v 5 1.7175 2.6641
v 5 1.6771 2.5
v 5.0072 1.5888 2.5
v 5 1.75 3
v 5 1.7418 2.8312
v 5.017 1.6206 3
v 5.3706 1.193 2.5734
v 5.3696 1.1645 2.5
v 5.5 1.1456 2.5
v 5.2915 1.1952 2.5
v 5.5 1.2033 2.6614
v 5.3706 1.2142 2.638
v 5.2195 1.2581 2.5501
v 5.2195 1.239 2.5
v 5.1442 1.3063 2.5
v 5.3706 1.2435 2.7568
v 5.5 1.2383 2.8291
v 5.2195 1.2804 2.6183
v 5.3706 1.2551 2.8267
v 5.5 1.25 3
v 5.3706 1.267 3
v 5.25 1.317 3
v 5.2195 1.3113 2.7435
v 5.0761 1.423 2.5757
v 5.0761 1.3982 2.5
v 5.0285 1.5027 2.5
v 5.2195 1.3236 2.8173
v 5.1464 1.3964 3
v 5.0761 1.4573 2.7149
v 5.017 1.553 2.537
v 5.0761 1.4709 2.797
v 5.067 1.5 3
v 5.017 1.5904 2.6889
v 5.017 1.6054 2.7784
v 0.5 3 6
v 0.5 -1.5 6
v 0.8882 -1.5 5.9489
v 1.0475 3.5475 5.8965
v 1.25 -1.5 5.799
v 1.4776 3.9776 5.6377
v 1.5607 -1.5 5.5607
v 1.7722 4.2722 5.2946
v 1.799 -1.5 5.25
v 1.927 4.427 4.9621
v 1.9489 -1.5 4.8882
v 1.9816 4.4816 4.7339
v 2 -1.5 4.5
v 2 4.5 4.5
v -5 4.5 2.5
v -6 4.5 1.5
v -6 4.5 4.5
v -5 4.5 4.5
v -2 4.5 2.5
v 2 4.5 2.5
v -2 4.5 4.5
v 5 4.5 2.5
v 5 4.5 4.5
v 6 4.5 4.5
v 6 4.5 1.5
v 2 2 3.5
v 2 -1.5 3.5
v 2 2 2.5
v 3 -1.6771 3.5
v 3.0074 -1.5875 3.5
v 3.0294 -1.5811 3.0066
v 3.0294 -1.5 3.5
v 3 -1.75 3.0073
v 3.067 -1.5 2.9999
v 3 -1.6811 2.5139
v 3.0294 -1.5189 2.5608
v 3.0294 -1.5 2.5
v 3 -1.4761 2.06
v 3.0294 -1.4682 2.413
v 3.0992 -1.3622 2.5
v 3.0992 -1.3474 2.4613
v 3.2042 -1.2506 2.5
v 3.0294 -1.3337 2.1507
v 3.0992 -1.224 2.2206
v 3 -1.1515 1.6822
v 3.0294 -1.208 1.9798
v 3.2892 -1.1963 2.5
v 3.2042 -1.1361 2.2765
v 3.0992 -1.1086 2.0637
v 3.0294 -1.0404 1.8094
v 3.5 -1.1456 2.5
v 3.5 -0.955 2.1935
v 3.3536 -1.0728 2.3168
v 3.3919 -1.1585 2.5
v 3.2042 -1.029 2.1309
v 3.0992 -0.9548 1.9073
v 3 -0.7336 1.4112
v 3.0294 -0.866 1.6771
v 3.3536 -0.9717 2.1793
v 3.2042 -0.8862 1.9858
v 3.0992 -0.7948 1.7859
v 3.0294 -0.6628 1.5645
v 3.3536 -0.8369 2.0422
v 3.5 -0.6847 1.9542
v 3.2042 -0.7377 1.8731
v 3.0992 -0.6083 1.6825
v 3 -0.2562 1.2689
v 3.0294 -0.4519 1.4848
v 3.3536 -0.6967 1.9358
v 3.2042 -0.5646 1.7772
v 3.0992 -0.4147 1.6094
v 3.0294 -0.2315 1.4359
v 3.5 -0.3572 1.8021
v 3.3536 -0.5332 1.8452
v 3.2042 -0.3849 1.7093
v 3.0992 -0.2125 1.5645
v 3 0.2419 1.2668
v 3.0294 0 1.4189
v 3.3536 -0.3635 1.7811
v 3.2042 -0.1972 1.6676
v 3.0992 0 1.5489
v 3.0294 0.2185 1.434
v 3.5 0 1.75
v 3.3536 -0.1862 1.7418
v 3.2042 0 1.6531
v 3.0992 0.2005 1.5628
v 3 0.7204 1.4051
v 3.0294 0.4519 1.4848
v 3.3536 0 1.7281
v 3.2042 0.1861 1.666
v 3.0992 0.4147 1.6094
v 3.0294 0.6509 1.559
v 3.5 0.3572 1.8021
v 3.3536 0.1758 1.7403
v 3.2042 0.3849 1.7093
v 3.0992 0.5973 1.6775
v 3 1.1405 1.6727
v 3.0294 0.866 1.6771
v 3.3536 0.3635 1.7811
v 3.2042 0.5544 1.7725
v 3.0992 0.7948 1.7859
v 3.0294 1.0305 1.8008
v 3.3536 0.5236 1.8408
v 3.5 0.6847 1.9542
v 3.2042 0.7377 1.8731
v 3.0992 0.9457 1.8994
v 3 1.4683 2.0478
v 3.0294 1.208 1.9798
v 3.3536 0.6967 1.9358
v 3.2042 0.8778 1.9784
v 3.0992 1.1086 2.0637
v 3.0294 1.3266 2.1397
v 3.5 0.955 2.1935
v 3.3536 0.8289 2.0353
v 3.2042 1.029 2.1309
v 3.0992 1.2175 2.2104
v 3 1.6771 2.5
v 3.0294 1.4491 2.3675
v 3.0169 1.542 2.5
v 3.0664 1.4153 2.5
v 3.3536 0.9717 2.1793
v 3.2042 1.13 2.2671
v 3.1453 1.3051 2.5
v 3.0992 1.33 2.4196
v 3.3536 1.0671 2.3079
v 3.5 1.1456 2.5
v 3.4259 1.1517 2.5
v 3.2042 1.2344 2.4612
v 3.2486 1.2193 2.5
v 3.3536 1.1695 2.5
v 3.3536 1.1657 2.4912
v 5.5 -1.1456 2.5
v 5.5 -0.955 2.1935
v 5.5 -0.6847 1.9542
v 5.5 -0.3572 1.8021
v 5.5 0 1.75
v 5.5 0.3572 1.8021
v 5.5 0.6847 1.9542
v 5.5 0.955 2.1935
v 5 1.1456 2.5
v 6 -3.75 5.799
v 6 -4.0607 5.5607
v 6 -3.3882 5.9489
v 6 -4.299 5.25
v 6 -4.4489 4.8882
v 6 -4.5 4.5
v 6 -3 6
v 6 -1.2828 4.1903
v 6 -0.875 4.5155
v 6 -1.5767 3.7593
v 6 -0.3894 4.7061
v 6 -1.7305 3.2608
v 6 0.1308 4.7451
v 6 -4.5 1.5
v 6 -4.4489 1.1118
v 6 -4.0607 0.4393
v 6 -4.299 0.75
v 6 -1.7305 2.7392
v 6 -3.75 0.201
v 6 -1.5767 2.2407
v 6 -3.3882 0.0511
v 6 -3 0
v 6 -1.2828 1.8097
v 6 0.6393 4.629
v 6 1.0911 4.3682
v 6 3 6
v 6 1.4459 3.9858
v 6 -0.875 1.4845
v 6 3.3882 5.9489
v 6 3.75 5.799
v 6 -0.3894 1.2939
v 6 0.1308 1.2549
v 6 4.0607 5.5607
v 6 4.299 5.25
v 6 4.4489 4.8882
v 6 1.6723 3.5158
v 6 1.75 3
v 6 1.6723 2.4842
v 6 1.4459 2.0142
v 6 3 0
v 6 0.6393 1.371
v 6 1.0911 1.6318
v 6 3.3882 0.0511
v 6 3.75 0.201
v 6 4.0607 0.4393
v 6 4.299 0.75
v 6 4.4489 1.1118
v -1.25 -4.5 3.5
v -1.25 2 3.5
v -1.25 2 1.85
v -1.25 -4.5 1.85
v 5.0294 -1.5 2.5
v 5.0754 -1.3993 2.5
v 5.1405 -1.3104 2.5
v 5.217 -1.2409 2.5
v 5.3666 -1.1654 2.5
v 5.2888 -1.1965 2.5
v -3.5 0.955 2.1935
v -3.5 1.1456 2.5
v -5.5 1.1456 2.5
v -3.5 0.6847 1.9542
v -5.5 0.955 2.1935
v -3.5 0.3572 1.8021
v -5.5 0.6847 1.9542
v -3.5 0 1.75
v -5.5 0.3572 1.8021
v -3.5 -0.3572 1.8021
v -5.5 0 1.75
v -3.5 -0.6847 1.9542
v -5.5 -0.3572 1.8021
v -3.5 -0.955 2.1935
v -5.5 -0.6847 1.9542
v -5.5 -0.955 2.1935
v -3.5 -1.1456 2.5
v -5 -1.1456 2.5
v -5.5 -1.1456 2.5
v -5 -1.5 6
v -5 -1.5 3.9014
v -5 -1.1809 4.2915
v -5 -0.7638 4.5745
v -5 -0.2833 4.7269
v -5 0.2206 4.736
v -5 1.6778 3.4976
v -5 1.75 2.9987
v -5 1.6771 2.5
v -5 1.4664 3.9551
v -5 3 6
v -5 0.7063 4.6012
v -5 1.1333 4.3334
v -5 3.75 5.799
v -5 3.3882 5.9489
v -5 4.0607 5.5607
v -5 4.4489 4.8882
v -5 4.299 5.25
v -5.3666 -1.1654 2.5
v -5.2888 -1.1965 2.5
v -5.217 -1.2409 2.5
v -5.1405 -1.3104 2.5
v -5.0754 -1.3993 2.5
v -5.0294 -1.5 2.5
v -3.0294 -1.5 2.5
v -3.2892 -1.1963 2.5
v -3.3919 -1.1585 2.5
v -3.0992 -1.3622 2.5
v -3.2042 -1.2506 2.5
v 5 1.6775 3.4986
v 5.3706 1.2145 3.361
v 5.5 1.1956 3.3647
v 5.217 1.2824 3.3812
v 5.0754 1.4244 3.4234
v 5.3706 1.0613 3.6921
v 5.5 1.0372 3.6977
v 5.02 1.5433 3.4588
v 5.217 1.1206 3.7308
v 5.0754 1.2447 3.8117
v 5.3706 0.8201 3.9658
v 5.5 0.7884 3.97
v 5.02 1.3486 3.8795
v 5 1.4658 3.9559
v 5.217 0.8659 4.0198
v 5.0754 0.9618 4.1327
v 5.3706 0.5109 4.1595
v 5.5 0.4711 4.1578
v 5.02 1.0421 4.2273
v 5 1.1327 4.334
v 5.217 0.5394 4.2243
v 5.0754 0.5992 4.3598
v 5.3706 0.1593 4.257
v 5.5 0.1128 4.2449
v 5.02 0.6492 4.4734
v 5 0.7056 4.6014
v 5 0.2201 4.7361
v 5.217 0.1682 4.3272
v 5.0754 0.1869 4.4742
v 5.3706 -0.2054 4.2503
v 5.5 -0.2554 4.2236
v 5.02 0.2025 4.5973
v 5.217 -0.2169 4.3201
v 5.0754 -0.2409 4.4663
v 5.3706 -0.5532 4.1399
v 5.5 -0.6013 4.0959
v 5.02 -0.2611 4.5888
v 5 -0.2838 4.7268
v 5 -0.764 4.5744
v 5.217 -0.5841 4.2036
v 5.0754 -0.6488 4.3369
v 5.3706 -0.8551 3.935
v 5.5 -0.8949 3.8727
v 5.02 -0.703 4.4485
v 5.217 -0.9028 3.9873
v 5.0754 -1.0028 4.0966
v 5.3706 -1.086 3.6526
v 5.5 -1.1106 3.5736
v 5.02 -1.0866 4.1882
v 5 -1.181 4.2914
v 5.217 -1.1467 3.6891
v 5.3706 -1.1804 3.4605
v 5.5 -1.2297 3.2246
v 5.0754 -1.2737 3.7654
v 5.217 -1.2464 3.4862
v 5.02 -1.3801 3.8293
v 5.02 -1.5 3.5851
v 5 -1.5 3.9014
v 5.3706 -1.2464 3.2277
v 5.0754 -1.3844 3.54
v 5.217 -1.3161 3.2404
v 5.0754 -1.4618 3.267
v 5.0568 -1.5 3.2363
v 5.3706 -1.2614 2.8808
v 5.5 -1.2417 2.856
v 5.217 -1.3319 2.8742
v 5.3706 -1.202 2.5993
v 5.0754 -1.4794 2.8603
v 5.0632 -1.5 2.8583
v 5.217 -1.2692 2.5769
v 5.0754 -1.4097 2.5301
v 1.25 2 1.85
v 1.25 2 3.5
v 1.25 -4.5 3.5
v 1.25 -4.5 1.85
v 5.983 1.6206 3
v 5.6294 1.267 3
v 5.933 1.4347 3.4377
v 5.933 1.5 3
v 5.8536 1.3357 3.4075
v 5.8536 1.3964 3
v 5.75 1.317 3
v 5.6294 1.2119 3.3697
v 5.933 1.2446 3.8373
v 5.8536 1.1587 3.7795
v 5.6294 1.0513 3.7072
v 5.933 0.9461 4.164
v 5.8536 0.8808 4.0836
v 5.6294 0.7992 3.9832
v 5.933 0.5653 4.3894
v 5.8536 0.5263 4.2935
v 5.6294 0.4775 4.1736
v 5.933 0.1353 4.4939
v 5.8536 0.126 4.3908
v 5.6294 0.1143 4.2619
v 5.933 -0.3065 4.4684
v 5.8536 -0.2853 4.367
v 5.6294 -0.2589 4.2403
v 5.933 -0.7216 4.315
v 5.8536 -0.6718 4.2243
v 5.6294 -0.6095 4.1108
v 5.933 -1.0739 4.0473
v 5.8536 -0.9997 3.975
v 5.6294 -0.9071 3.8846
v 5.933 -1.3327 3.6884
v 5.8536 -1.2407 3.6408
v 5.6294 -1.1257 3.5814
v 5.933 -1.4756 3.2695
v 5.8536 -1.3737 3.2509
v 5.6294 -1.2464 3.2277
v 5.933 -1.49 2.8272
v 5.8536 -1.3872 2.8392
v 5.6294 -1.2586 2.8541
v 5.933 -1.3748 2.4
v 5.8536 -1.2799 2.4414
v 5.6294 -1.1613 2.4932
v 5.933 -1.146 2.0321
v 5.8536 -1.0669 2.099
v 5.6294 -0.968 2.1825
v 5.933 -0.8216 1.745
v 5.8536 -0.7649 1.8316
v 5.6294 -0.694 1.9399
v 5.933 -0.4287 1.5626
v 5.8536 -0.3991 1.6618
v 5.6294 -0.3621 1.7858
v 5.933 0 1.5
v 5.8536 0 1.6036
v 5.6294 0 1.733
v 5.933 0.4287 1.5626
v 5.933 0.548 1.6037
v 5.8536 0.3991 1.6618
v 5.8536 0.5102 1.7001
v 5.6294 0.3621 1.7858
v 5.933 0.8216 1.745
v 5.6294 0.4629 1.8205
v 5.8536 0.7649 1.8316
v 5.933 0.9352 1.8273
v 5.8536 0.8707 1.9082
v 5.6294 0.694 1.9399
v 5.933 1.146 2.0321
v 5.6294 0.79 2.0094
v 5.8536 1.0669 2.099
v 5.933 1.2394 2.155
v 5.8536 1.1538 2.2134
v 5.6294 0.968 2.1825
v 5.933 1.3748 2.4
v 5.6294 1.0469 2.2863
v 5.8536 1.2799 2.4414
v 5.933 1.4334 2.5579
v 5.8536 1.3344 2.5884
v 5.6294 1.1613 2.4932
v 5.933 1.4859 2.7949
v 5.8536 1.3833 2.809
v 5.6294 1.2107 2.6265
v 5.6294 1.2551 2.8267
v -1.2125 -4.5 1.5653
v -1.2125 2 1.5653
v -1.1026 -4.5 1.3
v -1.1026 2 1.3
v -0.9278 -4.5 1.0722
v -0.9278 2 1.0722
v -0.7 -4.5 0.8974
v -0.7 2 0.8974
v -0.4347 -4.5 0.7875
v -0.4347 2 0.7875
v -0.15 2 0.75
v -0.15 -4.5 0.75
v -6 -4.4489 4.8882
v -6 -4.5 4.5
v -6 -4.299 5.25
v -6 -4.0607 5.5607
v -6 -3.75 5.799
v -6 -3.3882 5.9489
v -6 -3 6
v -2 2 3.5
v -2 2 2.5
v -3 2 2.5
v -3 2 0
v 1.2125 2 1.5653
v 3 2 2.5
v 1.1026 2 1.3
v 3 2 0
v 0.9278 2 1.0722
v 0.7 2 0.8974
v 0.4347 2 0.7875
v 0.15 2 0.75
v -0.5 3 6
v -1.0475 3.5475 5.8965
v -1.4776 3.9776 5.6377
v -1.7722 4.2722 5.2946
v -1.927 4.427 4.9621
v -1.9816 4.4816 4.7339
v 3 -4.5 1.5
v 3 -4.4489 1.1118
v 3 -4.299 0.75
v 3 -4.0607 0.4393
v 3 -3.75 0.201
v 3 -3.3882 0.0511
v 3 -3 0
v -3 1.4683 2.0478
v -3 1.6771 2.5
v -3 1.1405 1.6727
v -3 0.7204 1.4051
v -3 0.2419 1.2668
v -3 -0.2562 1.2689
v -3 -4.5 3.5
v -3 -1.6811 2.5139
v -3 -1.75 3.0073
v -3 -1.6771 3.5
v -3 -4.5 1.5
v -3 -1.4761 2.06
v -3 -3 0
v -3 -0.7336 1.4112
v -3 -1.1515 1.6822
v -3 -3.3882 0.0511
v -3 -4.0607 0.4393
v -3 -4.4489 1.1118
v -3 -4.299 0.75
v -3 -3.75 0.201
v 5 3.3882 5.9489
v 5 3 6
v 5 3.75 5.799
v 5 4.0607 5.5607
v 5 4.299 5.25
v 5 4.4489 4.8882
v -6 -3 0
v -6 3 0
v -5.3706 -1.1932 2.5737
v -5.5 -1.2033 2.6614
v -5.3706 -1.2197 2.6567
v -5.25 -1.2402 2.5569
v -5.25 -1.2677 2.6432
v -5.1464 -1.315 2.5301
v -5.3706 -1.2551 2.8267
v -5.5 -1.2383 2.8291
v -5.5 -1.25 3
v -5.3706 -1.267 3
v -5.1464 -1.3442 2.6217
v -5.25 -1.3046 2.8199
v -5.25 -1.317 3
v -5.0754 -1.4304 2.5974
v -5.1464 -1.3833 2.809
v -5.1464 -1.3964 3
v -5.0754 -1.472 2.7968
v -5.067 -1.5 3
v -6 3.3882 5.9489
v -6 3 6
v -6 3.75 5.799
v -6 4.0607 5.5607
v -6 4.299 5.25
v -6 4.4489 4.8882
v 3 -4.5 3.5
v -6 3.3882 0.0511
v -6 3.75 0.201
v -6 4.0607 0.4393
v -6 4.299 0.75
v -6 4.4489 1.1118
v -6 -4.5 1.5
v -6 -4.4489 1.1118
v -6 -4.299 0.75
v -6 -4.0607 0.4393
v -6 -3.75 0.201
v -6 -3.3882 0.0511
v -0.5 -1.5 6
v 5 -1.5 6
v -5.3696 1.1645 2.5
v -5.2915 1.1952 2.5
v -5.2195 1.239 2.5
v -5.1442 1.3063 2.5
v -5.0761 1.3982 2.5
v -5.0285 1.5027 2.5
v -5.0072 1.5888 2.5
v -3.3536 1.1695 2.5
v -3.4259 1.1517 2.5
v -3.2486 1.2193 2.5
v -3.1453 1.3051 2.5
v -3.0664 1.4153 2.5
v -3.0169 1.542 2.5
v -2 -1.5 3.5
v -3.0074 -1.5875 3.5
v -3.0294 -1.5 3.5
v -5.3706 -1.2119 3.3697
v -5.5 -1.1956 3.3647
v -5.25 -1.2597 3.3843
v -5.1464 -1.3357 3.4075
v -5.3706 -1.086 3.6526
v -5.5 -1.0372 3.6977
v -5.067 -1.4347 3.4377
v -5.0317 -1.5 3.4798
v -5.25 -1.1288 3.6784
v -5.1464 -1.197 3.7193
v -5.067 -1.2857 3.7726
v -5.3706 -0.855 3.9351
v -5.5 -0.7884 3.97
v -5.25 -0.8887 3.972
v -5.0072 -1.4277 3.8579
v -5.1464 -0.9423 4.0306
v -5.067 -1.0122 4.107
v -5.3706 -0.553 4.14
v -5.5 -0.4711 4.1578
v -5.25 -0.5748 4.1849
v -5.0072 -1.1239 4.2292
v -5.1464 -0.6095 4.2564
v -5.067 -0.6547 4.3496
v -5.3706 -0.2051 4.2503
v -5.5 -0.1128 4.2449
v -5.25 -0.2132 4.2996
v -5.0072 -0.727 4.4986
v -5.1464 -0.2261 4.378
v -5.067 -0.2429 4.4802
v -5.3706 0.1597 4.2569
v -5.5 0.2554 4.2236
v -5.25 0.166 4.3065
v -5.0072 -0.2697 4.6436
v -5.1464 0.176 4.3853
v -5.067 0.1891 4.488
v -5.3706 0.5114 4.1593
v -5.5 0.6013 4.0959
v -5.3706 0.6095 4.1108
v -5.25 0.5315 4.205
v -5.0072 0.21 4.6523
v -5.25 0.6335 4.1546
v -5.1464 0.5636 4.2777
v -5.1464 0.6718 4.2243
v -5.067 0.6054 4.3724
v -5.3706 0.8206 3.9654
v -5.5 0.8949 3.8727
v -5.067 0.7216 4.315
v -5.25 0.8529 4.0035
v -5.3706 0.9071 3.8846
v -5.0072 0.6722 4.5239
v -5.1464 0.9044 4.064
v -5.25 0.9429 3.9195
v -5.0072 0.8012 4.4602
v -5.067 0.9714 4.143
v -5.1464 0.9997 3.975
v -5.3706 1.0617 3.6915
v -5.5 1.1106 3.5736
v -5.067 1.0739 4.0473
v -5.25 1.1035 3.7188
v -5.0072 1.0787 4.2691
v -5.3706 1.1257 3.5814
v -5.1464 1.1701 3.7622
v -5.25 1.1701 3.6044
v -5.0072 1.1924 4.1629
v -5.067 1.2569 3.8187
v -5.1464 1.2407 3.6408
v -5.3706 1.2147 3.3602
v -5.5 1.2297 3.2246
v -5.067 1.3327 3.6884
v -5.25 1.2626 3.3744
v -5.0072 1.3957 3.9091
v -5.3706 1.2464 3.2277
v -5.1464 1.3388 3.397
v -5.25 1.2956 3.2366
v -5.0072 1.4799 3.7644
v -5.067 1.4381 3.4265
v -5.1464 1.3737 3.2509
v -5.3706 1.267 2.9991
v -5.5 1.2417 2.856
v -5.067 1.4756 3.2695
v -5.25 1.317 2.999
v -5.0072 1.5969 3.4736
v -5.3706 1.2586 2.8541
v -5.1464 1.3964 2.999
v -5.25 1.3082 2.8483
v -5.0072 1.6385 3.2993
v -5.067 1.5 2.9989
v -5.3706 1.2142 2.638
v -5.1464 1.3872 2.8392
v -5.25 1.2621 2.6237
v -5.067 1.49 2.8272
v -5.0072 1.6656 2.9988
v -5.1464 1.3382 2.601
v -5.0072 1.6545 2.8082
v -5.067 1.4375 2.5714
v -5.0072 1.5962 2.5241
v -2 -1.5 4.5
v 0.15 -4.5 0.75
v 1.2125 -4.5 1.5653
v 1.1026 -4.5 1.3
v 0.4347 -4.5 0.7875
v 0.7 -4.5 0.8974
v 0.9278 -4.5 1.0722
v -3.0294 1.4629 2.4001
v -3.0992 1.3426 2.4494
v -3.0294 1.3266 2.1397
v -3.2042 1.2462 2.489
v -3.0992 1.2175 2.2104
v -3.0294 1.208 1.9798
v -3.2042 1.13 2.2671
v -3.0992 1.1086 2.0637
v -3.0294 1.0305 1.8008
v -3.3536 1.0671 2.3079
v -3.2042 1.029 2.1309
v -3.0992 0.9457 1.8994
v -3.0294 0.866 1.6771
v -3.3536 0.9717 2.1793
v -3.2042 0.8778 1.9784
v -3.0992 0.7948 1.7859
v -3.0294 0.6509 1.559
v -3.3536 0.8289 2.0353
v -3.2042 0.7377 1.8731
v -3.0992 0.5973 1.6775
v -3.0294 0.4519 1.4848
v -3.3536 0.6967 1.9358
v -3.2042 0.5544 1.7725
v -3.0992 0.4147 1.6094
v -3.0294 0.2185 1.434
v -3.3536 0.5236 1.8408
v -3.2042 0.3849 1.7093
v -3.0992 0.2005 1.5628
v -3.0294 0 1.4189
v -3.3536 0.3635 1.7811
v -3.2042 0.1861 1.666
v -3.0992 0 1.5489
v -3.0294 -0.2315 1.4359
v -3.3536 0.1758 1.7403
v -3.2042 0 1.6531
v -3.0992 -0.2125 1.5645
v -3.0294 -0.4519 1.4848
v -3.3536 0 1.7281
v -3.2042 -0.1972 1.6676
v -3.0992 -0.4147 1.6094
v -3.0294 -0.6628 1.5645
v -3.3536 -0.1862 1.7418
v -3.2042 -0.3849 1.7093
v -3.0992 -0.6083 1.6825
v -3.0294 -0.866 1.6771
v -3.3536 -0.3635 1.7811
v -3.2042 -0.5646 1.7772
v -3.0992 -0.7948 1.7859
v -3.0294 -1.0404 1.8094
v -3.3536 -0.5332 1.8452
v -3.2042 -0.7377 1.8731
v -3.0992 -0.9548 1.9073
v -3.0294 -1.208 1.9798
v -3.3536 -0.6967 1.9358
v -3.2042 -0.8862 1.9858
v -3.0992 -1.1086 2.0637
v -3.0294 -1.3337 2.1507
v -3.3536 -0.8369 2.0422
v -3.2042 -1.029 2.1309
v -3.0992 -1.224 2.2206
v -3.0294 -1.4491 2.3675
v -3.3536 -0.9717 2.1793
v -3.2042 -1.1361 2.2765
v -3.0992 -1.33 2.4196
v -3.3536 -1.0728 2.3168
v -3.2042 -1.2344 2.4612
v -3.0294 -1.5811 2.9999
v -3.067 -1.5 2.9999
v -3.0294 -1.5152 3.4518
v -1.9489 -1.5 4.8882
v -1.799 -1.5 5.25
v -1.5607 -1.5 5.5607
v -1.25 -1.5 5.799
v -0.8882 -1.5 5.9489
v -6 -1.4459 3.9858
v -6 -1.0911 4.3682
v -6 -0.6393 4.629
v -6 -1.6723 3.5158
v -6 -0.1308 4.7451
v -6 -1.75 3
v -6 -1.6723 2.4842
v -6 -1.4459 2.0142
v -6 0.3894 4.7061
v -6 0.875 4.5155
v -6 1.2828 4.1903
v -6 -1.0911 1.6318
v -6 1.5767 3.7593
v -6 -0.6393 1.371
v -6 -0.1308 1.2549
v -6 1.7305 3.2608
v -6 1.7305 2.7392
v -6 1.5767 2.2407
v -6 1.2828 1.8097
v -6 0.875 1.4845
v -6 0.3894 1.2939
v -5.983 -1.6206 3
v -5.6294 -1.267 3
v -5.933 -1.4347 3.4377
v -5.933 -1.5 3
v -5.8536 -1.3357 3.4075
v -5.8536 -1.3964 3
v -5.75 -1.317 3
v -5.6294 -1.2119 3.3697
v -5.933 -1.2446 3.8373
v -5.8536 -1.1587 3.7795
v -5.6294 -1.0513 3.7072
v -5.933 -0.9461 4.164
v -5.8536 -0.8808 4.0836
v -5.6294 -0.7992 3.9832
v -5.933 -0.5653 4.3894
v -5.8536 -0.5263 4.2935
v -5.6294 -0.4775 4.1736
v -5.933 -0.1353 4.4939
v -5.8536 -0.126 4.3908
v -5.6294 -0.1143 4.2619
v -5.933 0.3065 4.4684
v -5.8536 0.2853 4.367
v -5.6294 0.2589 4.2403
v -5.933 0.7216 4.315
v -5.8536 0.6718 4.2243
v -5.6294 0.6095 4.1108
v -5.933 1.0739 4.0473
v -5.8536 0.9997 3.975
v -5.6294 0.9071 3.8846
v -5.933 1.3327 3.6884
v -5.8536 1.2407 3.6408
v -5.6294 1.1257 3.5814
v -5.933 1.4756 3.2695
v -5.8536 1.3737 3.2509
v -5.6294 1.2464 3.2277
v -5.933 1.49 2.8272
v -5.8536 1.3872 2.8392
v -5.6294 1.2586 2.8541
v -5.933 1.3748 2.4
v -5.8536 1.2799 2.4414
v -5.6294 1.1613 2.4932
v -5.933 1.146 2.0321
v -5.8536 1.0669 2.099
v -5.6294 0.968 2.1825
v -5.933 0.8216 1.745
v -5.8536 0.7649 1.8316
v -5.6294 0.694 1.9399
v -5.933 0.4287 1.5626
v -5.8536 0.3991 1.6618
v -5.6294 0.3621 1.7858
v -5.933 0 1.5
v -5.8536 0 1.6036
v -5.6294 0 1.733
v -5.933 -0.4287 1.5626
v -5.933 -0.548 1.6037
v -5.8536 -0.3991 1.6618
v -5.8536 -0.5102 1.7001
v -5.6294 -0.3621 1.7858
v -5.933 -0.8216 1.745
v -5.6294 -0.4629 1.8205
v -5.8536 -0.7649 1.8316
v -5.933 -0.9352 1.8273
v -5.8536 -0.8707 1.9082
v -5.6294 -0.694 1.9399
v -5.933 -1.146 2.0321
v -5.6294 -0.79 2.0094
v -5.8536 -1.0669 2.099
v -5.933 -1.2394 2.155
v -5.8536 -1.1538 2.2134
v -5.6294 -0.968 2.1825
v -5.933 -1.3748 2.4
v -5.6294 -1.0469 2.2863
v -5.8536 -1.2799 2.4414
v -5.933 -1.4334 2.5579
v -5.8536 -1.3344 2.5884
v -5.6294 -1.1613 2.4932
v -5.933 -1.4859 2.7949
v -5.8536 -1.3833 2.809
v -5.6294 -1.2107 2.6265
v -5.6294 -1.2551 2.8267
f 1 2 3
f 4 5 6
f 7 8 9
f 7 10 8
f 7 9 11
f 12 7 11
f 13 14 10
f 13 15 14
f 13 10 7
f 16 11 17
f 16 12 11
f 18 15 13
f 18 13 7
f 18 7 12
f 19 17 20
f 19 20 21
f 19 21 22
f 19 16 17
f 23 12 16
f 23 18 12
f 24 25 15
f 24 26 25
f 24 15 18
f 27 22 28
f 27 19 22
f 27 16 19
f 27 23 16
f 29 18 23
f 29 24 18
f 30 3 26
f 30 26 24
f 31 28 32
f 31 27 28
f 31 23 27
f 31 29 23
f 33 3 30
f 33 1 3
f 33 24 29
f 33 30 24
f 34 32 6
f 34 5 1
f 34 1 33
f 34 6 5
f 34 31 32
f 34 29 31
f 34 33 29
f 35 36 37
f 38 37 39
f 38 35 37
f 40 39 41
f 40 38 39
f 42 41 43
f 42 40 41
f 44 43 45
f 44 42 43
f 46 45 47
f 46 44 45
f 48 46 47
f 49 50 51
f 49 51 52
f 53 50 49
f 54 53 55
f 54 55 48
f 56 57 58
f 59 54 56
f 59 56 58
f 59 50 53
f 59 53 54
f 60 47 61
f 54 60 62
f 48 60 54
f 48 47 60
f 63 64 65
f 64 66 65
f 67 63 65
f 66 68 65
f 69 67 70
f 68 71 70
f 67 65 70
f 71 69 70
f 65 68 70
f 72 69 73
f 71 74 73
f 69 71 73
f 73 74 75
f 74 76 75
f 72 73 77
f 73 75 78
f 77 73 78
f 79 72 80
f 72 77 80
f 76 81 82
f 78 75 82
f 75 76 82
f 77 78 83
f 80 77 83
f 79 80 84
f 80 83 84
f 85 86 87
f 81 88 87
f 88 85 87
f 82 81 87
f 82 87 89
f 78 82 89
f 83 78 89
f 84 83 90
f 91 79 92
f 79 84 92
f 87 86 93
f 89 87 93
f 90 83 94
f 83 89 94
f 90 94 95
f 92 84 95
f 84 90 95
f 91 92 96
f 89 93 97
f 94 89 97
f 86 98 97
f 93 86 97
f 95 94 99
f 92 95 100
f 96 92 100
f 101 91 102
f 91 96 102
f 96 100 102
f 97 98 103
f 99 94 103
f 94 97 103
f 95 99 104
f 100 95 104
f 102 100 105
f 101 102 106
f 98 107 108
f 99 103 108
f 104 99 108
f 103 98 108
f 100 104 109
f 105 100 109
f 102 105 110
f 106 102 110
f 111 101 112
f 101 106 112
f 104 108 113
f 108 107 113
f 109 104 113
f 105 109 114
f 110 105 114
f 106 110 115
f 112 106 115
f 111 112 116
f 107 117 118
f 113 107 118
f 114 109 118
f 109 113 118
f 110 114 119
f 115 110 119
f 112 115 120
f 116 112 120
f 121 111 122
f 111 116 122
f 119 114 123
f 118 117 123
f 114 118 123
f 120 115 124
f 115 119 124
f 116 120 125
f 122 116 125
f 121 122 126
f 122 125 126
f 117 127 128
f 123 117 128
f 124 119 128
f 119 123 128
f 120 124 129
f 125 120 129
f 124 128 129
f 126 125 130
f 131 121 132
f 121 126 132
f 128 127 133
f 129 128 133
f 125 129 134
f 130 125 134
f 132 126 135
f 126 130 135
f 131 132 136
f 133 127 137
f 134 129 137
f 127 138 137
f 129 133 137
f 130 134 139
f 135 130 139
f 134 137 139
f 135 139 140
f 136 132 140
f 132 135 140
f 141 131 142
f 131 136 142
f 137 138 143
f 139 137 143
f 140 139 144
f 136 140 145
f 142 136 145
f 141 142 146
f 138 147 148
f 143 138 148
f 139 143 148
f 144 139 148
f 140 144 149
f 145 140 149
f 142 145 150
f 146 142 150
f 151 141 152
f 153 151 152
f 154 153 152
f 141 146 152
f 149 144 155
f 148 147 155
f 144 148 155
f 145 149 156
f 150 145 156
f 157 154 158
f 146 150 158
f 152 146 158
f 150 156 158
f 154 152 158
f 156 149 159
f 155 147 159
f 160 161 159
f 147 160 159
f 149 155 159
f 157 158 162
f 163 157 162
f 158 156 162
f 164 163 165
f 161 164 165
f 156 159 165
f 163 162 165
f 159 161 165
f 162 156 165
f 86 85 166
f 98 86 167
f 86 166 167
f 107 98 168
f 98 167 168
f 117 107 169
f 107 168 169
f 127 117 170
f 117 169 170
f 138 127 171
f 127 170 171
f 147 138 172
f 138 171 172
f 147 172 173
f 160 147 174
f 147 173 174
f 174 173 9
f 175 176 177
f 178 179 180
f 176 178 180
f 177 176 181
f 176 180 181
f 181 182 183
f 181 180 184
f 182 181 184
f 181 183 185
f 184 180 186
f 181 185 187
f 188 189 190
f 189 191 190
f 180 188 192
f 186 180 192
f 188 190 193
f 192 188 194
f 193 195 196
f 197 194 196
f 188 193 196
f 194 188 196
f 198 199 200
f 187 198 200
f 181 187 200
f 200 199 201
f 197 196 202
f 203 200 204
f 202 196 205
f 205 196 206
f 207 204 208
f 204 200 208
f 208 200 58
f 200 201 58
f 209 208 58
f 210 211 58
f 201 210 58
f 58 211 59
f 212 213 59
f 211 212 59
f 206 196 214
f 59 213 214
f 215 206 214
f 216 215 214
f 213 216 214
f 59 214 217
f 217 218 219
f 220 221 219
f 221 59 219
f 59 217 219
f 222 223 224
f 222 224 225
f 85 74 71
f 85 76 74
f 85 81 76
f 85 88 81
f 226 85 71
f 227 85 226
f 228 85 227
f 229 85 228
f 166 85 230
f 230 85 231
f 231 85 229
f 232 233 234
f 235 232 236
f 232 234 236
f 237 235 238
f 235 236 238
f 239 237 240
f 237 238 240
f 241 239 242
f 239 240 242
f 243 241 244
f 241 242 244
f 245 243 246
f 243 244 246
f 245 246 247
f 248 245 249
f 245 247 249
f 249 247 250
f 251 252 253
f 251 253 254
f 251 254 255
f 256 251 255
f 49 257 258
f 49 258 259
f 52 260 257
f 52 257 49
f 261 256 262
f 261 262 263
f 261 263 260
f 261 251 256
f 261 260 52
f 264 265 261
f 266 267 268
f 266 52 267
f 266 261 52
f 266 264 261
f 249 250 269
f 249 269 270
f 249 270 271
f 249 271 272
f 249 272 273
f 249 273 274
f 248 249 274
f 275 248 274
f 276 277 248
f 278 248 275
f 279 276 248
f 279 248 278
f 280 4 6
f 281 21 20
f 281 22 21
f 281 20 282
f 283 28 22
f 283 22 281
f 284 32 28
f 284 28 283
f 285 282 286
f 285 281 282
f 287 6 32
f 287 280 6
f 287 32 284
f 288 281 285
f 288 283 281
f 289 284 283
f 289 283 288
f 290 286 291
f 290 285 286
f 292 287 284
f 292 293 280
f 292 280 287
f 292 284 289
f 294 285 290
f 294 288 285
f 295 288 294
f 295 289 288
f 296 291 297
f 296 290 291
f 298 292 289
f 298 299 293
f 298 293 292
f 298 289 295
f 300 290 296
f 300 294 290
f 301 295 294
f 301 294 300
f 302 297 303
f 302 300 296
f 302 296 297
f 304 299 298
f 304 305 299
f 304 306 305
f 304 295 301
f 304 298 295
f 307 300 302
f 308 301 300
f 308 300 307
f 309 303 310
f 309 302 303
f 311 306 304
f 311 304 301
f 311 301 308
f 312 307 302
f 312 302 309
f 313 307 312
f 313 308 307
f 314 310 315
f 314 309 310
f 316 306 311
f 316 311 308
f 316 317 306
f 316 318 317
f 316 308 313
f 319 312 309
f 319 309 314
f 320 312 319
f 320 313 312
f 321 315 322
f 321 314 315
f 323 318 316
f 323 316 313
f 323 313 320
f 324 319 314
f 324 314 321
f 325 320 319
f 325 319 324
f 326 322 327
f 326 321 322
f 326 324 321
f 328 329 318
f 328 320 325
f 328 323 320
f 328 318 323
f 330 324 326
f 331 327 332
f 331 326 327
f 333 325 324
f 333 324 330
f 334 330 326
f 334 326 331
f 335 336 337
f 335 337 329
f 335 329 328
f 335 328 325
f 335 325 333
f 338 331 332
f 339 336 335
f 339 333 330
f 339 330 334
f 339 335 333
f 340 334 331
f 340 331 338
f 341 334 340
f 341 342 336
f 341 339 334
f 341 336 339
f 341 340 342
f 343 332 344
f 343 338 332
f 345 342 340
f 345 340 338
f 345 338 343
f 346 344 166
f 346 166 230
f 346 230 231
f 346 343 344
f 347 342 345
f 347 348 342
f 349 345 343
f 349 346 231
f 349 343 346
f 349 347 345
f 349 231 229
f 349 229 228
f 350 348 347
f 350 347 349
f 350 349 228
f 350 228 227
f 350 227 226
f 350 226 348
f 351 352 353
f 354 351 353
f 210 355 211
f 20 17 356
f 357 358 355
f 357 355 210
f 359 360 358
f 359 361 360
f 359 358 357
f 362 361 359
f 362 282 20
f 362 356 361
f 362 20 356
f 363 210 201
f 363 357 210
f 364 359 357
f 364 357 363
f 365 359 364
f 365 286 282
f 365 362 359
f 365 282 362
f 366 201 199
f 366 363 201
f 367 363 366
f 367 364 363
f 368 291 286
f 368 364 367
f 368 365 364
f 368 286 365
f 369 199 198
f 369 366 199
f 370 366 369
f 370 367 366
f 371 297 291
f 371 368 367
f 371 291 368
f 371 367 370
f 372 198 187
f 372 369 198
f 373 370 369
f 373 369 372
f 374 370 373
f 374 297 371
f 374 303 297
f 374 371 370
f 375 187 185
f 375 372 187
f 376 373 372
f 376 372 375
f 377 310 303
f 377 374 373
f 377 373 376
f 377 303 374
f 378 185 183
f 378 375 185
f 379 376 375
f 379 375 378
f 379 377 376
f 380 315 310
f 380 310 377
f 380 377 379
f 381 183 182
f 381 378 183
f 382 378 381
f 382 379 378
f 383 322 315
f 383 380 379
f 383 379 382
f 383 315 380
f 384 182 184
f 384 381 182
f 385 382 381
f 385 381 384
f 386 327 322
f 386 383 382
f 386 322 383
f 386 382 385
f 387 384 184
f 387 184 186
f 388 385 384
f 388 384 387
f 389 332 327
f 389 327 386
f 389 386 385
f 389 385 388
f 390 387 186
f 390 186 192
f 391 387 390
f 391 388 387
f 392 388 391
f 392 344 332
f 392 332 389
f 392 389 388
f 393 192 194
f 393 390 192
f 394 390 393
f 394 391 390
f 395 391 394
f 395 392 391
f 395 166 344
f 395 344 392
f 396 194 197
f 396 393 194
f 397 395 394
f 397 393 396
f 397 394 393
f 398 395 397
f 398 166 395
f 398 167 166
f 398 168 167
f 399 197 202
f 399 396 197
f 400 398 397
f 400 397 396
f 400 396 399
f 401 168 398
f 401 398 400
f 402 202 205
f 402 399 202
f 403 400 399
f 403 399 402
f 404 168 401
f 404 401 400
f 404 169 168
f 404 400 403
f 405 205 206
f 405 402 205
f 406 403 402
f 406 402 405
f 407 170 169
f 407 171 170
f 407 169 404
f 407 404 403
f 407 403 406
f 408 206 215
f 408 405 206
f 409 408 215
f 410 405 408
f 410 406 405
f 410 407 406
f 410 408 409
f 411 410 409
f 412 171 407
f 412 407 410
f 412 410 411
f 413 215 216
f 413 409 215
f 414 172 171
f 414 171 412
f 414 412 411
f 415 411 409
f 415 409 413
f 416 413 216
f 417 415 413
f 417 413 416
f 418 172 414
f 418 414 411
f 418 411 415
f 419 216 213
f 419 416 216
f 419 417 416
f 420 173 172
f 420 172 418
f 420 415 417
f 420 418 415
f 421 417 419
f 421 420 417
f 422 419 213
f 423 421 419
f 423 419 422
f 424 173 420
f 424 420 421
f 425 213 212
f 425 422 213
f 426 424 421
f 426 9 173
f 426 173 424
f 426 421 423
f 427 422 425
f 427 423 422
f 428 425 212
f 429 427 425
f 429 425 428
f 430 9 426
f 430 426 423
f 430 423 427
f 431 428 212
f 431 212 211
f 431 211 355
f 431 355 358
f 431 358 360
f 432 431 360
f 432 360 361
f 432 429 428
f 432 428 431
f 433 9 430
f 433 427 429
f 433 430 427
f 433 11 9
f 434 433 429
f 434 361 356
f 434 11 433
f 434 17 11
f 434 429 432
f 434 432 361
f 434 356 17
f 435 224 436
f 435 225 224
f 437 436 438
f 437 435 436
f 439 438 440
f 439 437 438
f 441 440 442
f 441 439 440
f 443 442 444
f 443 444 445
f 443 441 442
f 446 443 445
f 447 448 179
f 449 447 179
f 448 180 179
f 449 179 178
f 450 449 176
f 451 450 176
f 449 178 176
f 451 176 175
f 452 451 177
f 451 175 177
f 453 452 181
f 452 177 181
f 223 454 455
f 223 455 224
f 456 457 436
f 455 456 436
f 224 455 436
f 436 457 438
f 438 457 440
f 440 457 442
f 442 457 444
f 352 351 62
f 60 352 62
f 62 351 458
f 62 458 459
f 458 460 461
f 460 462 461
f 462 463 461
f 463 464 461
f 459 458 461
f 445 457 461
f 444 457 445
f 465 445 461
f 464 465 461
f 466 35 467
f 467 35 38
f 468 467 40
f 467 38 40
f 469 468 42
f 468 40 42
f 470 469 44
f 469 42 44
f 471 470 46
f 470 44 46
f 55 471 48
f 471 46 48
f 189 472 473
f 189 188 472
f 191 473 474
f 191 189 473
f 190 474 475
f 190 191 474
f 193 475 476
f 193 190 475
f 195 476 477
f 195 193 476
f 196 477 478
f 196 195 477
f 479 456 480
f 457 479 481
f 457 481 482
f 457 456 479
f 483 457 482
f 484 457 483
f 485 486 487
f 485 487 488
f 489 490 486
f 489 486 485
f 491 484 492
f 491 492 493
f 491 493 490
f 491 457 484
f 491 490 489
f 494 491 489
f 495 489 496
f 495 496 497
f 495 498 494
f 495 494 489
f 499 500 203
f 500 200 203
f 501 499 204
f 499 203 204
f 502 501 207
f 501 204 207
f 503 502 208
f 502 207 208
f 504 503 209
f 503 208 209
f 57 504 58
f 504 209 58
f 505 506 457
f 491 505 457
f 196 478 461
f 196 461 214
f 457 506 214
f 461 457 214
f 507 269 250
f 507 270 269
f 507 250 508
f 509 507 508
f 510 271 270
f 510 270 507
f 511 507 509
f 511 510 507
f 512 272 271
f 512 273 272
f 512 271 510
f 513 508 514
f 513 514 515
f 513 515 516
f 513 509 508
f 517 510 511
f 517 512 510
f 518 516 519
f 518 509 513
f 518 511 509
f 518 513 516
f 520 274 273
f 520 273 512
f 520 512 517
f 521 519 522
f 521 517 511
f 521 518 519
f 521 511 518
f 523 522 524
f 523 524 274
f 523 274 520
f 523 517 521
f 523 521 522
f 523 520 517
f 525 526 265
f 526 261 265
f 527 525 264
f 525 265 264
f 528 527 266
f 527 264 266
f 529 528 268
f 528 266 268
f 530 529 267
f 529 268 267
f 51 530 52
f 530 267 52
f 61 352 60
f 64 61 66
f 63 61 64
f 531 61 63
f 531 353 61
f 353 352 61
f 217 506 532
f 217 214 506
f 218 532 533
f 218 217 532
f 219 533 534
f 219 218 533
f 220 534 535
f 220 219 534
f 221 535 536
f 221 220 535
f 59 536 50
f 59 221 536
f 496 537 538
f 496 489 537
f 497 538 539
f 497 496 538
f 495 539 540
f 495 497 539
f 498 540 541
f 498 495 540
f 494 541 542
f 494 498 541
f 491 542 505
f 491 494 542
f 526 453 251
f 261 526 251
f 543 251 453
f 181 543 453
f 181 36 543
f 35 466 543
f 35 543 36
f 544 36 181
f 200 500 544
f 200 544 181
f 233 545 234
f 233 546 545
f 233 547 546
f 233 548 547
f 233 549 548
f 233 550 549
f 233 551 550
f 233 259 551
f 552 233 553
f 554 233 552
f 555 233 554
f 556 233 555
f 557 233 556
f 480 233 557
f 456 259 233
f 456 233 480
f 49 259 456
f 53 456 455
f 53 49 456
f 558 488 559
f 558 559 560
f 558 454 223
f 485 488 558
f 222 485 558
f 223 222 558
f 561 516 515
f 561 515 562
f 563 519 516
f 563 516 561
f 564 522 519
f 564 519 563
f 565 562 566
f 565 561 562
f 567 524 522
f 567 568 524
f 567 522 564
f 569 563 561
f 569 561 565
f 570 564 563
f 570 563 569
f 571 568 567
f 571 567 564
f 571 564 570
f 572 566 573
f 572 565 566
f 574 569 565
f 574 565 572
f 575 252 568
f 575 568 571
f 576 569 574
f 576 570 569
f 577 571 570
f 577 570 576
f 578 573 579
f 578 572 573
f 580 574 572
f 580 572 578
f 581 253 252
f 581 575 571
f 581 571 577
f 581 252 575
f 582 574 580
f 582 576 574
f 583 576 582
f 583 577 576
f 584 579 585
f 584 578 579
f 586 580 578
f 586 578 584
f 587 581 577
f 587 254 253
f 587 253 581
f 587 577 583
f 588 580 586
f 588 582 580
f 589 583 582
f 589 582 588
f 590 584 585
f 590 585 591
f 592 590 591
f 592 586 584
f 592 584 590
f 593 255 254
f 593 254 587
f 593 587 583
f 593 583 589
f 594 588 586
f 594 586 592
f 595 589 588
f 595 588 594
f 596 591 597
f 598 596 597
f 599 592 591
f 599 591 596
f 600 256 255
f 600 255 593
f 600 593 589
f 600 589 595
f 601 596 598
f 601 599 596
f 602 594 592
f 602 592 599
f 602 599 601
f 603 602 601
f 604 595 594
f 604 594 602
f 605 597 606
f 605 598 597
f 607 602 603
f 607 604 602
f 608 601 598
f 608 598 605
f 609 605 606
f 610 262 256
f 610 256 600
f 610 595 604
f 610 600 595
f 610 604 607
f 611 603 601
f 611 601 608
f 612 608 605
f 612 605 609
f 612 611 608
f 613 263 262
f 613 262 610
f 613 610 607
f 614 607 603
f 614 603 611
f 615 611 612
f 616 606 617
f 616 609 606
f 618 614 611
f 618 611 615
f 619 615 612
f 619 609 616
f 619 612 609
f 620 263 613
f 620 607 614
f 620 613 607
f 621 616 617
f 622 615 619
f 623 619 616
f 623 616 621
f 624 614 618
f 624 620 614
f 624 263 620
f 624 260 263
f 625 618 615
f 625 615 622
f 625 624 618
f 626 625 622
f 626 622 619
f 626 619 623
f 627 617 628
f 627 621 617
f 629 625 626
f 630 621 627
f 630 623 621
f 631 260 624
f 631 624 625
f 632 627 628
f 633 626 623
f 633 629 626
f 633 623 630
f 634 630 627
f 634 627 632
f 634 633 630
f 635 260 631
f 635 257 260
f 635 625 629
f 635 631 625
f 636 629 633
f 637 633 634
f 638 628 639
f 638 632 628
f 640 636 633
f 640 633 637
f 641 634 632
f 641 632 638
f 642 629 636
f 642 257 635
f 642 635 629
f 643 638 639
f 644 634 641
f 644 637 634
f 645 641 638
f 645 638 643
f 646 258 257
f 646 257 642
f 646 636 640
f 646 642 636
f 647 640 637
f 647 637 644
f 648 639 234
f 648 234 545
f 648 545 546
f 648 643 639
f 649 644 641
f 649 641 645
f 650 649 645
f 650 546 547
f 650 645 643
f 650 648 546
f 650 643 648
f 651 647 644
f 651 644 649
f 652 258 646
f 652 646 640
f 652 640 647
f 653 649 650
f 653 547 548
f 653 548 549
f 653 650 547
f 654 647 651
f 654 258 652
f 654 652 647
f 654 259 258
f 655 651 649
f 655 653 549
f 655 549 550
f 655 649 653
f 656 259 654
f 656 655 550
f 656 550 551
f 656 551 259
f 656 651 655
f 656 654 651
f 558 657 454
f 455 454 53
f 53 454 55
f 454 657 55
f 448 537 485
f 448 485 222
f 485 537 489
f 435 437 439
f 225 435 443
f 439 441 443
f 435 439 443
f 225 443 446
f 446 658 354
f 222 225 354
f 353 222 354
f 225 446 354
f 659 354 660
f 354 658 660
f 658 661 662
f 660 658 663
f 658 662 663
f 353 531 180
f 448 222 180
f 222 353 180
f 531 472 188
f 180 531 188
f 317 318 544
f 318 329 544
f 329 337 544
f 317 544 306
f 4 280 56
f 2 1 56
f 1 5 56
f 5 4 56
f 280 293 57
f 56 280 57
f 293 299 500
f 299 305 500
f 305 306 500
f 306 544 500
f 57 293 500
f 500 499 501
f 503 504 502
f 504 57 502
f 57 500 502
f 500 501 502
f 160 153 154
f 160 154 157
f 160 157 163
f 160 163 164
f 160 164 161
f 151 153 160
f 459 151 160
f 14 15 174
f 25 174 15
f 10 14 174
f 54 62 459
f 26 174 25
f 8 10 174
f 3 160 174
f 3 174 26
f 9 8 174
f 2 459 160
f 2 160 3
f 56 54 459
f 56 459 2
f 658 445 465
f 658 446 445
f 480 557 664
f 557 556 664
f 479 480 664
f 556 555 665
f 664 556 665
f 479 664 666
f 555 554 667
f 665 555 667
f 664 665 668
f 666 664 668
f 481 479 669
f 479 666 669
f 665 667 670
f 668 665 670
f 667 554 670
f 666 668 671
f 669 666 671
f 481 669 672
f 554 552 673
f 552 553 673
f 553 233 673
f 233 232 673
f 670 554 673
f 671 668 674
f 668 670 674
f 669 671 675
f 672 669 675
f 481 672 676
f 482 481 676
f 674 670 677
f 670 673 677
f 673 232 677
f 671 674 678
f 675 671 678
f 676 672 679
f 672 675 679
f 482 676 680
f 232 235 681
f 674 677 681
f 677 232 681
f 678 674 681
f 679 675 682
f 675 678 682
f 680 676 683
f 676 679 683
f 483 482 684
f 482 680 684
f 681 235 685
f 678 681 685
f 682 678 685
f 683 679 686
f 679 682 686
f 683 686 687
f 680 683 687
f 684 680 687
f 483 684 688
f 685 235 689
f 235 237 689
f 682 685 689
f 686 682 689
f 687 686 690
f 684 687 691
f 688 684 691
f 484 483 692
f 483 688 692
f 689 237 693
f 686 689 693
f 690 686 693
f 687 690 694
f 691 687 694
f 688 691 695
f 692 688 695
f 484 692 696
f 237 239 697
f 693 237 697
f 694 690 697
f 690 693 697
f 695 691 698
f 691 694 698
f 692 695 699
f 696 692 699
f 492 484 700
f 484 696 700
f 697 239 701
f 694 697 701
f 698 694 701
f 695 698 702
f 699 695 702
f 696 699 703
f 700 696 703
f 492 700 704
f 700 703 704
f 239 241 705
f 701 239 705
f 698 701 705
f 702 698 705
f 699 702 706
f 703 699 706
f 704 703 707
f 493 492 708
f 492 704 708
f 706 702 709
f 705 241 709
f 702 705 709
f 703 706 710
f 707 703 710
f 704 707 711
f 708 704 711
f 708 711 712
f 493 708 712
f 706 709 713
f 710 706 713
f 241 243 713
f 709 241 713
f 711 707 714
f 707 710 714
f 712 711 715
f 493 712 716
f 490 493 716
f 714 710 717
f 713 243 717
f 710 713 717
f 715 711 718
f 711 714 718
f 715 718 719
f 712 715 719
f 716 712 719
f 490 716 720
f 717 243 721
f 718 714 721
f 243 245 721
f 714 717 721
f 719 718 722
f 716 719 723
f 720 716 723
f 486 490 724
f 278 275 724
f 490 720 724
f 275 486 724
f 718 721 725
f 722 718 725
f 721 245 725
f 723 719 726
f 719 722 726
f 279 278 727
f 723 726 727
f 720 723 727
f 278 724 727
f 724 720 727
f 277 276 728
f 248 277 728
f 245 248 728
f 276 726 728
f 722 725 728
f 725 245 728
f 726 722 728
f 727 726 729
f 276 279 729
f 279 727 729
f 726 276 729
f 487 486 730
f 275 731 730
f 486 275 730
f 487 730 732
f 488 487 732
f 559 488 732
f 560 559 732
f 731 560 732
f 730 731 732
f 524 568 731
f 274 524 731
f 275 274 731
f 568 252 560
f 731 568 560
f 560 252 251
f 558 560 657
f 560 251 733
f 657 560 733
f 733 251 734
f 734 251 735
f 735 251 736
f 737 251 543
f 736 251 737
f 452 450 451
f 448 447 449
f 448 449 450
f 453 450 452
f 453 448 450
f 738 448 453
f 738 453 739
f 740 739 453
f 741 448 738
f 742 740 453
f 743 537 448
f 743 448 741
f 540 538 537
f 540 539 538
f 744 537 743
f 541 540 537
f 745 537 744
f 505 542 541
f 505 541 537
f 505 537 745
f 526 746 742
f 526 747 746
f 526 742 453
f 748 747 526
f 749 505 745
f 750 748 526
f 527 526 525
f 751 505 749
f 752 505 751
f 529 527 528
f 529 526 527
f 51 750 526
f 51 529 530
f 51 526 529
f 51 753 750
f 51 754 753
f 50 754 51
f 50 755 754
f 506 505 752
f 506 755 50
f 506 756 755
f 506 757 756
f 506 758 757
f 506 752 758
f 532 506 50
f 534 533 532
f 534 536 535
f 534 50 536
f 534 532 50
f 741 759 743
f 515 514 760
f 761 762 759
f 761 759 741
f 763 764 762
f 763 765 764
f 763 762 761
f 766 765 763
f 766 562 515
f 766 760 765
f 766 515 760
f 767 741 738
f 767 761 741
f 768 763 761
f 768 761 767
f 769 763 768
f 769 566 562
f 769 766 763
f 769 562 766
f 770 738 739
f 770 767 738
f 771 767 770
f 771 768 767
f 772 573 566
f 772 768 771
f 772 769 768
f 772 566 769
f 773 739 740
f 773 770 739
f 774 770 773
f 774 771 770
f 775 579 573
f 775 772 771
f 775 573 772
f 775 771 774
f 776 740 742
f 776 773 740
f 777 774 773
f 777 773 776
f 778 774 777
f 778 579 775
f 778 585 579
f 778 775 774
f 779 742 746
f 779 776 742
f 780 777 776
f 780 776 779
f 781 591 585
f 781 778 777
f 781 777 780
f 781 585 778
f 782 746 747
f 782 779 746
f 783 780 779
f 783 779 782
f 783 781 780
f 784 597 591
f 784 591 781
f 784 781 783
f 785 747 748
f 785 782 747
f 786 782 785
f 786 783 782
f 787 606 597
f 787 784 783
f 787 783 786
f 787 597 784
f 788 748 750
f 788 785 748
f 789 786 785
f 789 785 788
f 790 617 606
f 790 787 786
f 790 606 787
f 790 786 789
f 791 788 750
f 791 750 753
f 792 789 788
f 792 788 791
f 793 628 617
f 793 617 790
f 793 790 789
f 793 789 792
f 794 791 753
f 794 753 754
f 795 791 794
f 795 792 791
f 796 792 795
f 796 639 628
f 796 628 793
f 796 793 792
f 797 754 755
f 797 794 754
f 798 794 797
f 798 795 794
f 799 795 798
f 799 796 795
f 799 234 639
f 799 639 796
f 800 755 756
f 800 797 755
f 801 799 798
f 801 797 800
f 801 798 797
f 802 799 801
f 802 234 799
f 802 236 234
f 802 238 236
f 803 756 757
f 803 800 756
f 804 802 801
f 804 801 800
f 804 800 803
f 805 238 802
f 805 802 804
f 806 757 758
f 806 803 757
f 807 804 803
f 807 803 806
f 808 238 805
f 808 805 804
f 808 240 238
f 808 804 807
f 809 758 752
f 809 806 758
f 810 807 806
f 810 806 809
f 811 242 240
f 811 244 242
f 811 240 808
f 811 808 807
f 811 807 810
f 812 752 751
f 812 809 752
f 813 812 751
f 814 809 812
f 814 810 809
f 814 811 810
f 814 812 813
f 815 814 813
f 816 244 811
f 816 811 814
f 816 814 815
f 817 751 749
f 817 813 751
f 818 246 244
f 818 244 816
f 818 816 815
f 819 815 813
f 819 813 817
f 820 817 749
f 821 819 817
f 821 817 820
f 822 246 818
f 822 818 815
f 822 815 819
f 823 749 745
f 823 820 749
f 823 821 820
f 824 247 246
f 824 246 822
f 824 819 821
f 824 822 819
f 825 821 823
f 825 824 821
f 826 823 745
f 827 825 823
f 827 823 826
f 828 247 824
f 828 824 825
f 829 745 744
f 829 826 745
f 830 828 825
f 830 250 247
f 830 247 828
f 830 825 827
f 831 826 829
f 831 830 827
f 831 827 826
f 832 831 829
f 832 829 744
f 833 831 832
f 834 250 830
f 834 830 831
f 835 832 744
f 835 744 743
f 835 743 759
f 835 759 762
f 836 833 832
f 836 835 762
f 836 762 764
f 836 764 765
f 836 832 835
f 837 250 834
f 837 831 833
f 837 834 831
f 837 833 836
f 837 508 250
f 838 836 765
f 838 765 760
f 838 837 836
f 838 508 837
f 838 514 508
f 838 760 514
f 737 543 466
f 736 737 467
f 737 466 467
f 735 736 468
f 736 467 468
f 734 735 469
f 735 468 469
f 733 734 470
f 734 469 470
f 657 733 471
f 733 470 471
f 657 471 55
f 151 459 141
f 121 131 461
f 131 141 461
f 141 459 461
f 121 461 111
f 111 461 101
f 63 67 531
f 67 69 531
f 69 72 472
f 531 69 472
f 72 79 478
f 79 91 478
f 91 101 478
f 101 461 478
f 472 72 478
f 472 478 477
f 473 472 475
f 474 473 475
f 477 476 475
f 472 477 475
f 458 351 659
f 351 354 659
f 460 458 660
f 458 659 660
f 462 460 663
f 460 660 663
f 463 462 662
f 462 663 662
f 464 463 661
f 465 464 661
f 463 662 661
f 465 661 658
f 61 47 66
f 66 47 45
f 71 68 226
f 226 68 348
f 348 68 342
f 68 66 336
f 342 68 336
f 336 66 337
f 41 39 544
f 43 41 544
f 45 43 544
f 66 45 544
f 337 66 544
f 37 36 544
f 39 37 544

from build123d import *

# Parameters (mm, degrees)
F0_W          = 12
F0_H          = 9
F1_DEPTH      = 6
F2_W          = 3
F2_H          = 6
F3_DEPTH      = 3.5
F4_W          = 6
F4_H          = 6.5
F5_DEPTH      = 3.5
F6_R          = 1.25
F7_DEPTH      = 3
F8_R          = 1.25
F9_DEPTH      = 3.001
F10_R         = 1.5
F11_W         = 2.5
F11_H         = 6.5
F12_DEPTH     = 2.75
F13_R         = 1.1
F14_T8_ANGLE  = 247.5355258221
F14_T13_ANGLE = 80.8755372564
F14_T18_ANGLE = 260.9918579461
F14_T24_ANGLE = 247.5355258221
F14_T29_ANGLE = 260.9918579461
F14_T35_ANGLE = 80.8755372564


# Not quite as in the source:
# - a fillet or chamfer that OpenCascade refuses, or shapes differently, is made with other operations: its cross-section is extruded or revolved along the edge and cut away or added


with BuildPart() as f1:
    # F0 (on Top) → F1 (new body)
    with BuildSketch(Plane.XY):
        Rectangle(F0_W, F0_H)
    extrude(amount=F1_DEPTH)

    # F2 (on face) → F3 (cut)
    with BuildSketch(Plane.XY.offset(6)):
        with Locations((3.5, 1.5)):
            Rectangle(F2_W, F2_H)
        with Locations((-3.5, 1.5)):
            Rectangle(F2_W, F2_H)
    extrude(amount=-F3_DEPTH, mode=Mode.SUBTRACT)

    # F4 (on face) → F5 (cut)
    with BuildSketch(Plane(origin=(0, 0, 0), x_dir=(1, 0, 0), z_dir=(0, 0, -1))):
        with Locations((0, 1.25)):
            Rectangle(F4_W, F4_H)
    extrude(amount=-F5_DEPTH, mode=Mode.SUBTRACT)

    # F6 (on face) → F7 (cut)
    with BuildSketch(Plane.YZ.offset(6)):
        with Locations((0, 3)):
            Circle(F6_R)
    extrude(amount=-F7_DEPTH, mode=Mode.SUBTRACT)

    # F8 (on face) → F9 (cut, through all)
    with BuildSketch(Plane(origin=(-6, 0, 0), x_dir=(0, -1, 0), z_dir=(-1, 0, 0))):
        with Locations((0, 3)):
            Circle(F8_R)
    extrude(amount=-F9_DEPTH, mode=Mode.SUBTRACT)

    # F10
    f10_edges = [f1.edges().sort_by_distance(p)[0] for p in [
        (2, 1.5, 6),
        (-2, 1.5, 6),
        (0, -4.5, 6),
        (-4.5, -4.5, 0),
        (4.5, -4.5, 0),
        (0, 4.5, 0),
        (-5.5, 4.5, 6),
        (5.5, 4.5, 6),
        (0, 4.5, 6),
    ]]
    fillet(f10_edges, radius=F10_R)

    # F11 (on face) → F12 (join)
    with BuildSketch(Plane(origin=(0, 0, 3.5), x_dir=(1, 0, 0), z_dir=(0, 0, -1))):
        with Locations((0, 1.25)):
            Rectangle(F11_W, F11_H)
    extrude(amount=F12_DEPTH)

    # F13
    f13_edges = [f1.edges().sort_by_distance(p)[0] for p in [
        (-1.25, -1.25, 0.75),
        (1.25, -1.25, 0.75),
    ]]
    fillet(f13_edges, radius=F13_R)

    # F14: fillet of radius 0.5 on 7 edges, made by hand

    # F14_s1 → F14_t2 (revolve, cut)
    with BuildSketch(Plane.XY.offset(3)):
        with BuildLine():
            ThreePointArc((6, 1.75), (5.8535533906, 1.3964466094), (5.5, 1.25))
            Line((5.5, 1.25), (6, 1.25))
            Line((6, 1.25), (6, 1.75))
        make_face()
    revolve(axis=Axis((6, 0, 3), (1, 0, 0)), mode=Mode.SUBTRACT)

    # F14_s3 → F14_t4 (revolve, cut)
    with BuildSketch(Plane.XY.offset(3)):
        with BuildLine():
            ThreePointArc((-6, -1.75), (-5.8535533906, -1.3964466094), (-5.5, -1.25))
            Line((-5.5, -1.25), (-6, -1.25))
            Line((-6, -1.25), (-6, -1.75))
        make_face()
    revolve(axis=Axis((-6, 0, 3), (-1, 0, 0)), mode=Mode.SUBTRACT)


with BuildPart() as f14_tool6:
    # F14_s7 → F14_t8 (revolve)
    with BuildSketch(Plane(origin=(0, -1.3861749524, 2.0731657713), x_dir=(1, 0, 0), z_dir=(0, -0.5558279796, 0.8312973338))):
        with BuildLine():
            ThreePointArc((-3, 3.4174839388), (-3.1464466094, 3.0639305482), (-3.5, 2.9174839388))
            Line((-3.5, 2.9174839388), (-3, 2.9174839388))
            Line((-3, 2.9174839388), (-3, 3.4174839388))
        make_face()
    revolve(axis=Axis((-3, 0, 3), (-1, 0, 0)), revolution_arc=F14_T8_ANGLE)

    split(bisect_by=Plane.XY.offset(3.5), keep=Keep.BOTTOM)


with BuildPart() as f1_1:
    add(f1.part)

    # F14_t5: cut F14_tool6
    add(f14_tool6.part, mode=Mode.SUBTRACT)


with BuildPart() as f14_tool11:
    # F14_s12 → F14_t13 (revolve)
    with BuildSketch(Plane(origin=(0, 0.469718994, 0.0754425014), x_dir=(1, 0, 0), z_dir=(0, -0.9873461903, -0.1585796345))):
        with BuildLine():
            ThreePointArc((5.5, 1.7120385709), (5.1464466094, 1.5655919615), (5, 1.2120385709))
            Line((5, 1.2120385709), (5, 1.7120385709))
            Line((5, 1.7120385709), (5.5, 1.7120385709))
        make_face()
    revolve(axis=Axis((5, 0, 3), (1, 0, 0)), revolution_arc=F14_T13_ANGLE)

    split(bisect_by=Plane.XY.offset(2.5), keep=Keep.TOP)


with BuildPart() as f1_2:
    add(f1_1.part)

    # F14_t10: cut F14_tool11
    add(f14_tool11.part, mode=Mode.SUBTRACT)


with BuildPart() as f14_tool16:
    # F14_s17 → F14_t18 (revolve)
    with BuildSketch(Plane.XY.offset(3)):
        with BuildLine():
            ThreePointArc((5.5, 1.25), (5.1464466094, 1.3964466094), (5, 1.75))
            Line((5, 1.75), (5, 1.25))
            Line((5, 1.25), (5.5, 1.25))
        make_face()
    revolve(axis=Axis((5, 0, 3), (1, 0, 0)), revolution_arc=F14_T18_ANGLE)

    split(bisect_by=Plane.XZ.offset(1.5), keep=Keep.BOTTOM)

    split(bisect_by=Plane.XY.offset(2.5), keep=Keep.TOP)


with BuildPart() as f1_3:
    add(f1_2.part)

    # F14_t15: cut F14_tool16
    add(f14_tool16.part, mode=Mode.SUBTRACT)


with BuildPart() as f14_tool22:
    # F14_s23 → F14_t24 (revolve)
    with BuildSketch(Plane(origin=(0, 1.3861749524, 2.0731657713), x_dir=(1, 0, 0), z_dir=(0, 0.5558279796, 0.8312973338))):
        with BuildLine():
            ThreePointArc((3, -3.4174839388), (3.1464466094, -3.0639305482), (3.5, -2.9174839388))
            Line((3.5, -2.9174839388), (3, -2.9174839388))
            Line((3, -2.9174839388), (3, -3.4174839388))
        make_face()
    revolve(axis=Axis((3, 0, 3), (1, 0, 0)), revolution_arc=F14_T24_ANGLE)

    split(bisect_by=Plane.XY.offset(3.5), keep=Keep.BOTTOM)


with BuildPart() as f1_4:
    add(f1_3.part)

    # F14_t21: cut F14_tool22
    add(f14_tool22.part, mode=Mode.SUBTRACT)


with BuildPart() as f14_tool27:
    # F14_s28 → F14_t29 (revolve)
    with BuildSketch(Plane.XY.offset(3)):
        with BuildLine():
            ThreePointArc((-5.5, -1.25), (-5.1464466094, -1.3964466094), (-5, -1.75))
            Line((-5, -1.75), (-5, -1.25))
            Line((-5, -1.25), (-5.5, -1.25))
        make_face()
    revolve(axis=Axis((-5, 0, 3), (-1, 0, 0)), revolution_arc=F14_T29_ANGLE)

    split(bisect_by=Plane.XZ.offset(1.5), keep=Keep.BOTTOM)

    split(bisect_by=Plane.XY.offset(2.5), keep=Keep.TOP)


with BuildPart() as f1_5:
    add(f1_4.part)

    # F14_t26: cut F14_tool27
    add(f14_tool27.part, mode=Mode.SUBTRACT)


with BuildPart() as f14_tool33:
    # F14_s34 → F14_t35 (revolve)
    with BuildSketch(Plane(origin=(0, -0.469718994, 0.0754425014), x_dir=(1, 0, 0), z_dir=(0, 0.9873461903, -0.1585796345))):
        with BuildLine():
            ThreePointArc((-5.5, -1.7120385709), (-5.1464466094, -1.5655919615), (-5, -1.2120385709))
            Line((-5, -1.2120385709), (-5, -1.7120385709))
            Line((-5, -1.7120385709), (-5.5, -1.7120385709))
        make_face()
    revolve(axis=Axis((-5, 0, 3), (-1, 0, 0)), revolution_arc=F14_T35_ANGLE)

    split(bisect_by=Plane.XZ.offset(1.5), keep=Keep.BOTTOM)

    split(bisect_by=Plane.XY.offset(2.5), keep=Keep.TOP)


with BuildPart() as f1_6:
    add(f1_5.part)

    # F14_t32: cut F14_tool33
    add(f14_tool33.part, mode=Mode.SUBTRACT)


solid = f1_6.part
